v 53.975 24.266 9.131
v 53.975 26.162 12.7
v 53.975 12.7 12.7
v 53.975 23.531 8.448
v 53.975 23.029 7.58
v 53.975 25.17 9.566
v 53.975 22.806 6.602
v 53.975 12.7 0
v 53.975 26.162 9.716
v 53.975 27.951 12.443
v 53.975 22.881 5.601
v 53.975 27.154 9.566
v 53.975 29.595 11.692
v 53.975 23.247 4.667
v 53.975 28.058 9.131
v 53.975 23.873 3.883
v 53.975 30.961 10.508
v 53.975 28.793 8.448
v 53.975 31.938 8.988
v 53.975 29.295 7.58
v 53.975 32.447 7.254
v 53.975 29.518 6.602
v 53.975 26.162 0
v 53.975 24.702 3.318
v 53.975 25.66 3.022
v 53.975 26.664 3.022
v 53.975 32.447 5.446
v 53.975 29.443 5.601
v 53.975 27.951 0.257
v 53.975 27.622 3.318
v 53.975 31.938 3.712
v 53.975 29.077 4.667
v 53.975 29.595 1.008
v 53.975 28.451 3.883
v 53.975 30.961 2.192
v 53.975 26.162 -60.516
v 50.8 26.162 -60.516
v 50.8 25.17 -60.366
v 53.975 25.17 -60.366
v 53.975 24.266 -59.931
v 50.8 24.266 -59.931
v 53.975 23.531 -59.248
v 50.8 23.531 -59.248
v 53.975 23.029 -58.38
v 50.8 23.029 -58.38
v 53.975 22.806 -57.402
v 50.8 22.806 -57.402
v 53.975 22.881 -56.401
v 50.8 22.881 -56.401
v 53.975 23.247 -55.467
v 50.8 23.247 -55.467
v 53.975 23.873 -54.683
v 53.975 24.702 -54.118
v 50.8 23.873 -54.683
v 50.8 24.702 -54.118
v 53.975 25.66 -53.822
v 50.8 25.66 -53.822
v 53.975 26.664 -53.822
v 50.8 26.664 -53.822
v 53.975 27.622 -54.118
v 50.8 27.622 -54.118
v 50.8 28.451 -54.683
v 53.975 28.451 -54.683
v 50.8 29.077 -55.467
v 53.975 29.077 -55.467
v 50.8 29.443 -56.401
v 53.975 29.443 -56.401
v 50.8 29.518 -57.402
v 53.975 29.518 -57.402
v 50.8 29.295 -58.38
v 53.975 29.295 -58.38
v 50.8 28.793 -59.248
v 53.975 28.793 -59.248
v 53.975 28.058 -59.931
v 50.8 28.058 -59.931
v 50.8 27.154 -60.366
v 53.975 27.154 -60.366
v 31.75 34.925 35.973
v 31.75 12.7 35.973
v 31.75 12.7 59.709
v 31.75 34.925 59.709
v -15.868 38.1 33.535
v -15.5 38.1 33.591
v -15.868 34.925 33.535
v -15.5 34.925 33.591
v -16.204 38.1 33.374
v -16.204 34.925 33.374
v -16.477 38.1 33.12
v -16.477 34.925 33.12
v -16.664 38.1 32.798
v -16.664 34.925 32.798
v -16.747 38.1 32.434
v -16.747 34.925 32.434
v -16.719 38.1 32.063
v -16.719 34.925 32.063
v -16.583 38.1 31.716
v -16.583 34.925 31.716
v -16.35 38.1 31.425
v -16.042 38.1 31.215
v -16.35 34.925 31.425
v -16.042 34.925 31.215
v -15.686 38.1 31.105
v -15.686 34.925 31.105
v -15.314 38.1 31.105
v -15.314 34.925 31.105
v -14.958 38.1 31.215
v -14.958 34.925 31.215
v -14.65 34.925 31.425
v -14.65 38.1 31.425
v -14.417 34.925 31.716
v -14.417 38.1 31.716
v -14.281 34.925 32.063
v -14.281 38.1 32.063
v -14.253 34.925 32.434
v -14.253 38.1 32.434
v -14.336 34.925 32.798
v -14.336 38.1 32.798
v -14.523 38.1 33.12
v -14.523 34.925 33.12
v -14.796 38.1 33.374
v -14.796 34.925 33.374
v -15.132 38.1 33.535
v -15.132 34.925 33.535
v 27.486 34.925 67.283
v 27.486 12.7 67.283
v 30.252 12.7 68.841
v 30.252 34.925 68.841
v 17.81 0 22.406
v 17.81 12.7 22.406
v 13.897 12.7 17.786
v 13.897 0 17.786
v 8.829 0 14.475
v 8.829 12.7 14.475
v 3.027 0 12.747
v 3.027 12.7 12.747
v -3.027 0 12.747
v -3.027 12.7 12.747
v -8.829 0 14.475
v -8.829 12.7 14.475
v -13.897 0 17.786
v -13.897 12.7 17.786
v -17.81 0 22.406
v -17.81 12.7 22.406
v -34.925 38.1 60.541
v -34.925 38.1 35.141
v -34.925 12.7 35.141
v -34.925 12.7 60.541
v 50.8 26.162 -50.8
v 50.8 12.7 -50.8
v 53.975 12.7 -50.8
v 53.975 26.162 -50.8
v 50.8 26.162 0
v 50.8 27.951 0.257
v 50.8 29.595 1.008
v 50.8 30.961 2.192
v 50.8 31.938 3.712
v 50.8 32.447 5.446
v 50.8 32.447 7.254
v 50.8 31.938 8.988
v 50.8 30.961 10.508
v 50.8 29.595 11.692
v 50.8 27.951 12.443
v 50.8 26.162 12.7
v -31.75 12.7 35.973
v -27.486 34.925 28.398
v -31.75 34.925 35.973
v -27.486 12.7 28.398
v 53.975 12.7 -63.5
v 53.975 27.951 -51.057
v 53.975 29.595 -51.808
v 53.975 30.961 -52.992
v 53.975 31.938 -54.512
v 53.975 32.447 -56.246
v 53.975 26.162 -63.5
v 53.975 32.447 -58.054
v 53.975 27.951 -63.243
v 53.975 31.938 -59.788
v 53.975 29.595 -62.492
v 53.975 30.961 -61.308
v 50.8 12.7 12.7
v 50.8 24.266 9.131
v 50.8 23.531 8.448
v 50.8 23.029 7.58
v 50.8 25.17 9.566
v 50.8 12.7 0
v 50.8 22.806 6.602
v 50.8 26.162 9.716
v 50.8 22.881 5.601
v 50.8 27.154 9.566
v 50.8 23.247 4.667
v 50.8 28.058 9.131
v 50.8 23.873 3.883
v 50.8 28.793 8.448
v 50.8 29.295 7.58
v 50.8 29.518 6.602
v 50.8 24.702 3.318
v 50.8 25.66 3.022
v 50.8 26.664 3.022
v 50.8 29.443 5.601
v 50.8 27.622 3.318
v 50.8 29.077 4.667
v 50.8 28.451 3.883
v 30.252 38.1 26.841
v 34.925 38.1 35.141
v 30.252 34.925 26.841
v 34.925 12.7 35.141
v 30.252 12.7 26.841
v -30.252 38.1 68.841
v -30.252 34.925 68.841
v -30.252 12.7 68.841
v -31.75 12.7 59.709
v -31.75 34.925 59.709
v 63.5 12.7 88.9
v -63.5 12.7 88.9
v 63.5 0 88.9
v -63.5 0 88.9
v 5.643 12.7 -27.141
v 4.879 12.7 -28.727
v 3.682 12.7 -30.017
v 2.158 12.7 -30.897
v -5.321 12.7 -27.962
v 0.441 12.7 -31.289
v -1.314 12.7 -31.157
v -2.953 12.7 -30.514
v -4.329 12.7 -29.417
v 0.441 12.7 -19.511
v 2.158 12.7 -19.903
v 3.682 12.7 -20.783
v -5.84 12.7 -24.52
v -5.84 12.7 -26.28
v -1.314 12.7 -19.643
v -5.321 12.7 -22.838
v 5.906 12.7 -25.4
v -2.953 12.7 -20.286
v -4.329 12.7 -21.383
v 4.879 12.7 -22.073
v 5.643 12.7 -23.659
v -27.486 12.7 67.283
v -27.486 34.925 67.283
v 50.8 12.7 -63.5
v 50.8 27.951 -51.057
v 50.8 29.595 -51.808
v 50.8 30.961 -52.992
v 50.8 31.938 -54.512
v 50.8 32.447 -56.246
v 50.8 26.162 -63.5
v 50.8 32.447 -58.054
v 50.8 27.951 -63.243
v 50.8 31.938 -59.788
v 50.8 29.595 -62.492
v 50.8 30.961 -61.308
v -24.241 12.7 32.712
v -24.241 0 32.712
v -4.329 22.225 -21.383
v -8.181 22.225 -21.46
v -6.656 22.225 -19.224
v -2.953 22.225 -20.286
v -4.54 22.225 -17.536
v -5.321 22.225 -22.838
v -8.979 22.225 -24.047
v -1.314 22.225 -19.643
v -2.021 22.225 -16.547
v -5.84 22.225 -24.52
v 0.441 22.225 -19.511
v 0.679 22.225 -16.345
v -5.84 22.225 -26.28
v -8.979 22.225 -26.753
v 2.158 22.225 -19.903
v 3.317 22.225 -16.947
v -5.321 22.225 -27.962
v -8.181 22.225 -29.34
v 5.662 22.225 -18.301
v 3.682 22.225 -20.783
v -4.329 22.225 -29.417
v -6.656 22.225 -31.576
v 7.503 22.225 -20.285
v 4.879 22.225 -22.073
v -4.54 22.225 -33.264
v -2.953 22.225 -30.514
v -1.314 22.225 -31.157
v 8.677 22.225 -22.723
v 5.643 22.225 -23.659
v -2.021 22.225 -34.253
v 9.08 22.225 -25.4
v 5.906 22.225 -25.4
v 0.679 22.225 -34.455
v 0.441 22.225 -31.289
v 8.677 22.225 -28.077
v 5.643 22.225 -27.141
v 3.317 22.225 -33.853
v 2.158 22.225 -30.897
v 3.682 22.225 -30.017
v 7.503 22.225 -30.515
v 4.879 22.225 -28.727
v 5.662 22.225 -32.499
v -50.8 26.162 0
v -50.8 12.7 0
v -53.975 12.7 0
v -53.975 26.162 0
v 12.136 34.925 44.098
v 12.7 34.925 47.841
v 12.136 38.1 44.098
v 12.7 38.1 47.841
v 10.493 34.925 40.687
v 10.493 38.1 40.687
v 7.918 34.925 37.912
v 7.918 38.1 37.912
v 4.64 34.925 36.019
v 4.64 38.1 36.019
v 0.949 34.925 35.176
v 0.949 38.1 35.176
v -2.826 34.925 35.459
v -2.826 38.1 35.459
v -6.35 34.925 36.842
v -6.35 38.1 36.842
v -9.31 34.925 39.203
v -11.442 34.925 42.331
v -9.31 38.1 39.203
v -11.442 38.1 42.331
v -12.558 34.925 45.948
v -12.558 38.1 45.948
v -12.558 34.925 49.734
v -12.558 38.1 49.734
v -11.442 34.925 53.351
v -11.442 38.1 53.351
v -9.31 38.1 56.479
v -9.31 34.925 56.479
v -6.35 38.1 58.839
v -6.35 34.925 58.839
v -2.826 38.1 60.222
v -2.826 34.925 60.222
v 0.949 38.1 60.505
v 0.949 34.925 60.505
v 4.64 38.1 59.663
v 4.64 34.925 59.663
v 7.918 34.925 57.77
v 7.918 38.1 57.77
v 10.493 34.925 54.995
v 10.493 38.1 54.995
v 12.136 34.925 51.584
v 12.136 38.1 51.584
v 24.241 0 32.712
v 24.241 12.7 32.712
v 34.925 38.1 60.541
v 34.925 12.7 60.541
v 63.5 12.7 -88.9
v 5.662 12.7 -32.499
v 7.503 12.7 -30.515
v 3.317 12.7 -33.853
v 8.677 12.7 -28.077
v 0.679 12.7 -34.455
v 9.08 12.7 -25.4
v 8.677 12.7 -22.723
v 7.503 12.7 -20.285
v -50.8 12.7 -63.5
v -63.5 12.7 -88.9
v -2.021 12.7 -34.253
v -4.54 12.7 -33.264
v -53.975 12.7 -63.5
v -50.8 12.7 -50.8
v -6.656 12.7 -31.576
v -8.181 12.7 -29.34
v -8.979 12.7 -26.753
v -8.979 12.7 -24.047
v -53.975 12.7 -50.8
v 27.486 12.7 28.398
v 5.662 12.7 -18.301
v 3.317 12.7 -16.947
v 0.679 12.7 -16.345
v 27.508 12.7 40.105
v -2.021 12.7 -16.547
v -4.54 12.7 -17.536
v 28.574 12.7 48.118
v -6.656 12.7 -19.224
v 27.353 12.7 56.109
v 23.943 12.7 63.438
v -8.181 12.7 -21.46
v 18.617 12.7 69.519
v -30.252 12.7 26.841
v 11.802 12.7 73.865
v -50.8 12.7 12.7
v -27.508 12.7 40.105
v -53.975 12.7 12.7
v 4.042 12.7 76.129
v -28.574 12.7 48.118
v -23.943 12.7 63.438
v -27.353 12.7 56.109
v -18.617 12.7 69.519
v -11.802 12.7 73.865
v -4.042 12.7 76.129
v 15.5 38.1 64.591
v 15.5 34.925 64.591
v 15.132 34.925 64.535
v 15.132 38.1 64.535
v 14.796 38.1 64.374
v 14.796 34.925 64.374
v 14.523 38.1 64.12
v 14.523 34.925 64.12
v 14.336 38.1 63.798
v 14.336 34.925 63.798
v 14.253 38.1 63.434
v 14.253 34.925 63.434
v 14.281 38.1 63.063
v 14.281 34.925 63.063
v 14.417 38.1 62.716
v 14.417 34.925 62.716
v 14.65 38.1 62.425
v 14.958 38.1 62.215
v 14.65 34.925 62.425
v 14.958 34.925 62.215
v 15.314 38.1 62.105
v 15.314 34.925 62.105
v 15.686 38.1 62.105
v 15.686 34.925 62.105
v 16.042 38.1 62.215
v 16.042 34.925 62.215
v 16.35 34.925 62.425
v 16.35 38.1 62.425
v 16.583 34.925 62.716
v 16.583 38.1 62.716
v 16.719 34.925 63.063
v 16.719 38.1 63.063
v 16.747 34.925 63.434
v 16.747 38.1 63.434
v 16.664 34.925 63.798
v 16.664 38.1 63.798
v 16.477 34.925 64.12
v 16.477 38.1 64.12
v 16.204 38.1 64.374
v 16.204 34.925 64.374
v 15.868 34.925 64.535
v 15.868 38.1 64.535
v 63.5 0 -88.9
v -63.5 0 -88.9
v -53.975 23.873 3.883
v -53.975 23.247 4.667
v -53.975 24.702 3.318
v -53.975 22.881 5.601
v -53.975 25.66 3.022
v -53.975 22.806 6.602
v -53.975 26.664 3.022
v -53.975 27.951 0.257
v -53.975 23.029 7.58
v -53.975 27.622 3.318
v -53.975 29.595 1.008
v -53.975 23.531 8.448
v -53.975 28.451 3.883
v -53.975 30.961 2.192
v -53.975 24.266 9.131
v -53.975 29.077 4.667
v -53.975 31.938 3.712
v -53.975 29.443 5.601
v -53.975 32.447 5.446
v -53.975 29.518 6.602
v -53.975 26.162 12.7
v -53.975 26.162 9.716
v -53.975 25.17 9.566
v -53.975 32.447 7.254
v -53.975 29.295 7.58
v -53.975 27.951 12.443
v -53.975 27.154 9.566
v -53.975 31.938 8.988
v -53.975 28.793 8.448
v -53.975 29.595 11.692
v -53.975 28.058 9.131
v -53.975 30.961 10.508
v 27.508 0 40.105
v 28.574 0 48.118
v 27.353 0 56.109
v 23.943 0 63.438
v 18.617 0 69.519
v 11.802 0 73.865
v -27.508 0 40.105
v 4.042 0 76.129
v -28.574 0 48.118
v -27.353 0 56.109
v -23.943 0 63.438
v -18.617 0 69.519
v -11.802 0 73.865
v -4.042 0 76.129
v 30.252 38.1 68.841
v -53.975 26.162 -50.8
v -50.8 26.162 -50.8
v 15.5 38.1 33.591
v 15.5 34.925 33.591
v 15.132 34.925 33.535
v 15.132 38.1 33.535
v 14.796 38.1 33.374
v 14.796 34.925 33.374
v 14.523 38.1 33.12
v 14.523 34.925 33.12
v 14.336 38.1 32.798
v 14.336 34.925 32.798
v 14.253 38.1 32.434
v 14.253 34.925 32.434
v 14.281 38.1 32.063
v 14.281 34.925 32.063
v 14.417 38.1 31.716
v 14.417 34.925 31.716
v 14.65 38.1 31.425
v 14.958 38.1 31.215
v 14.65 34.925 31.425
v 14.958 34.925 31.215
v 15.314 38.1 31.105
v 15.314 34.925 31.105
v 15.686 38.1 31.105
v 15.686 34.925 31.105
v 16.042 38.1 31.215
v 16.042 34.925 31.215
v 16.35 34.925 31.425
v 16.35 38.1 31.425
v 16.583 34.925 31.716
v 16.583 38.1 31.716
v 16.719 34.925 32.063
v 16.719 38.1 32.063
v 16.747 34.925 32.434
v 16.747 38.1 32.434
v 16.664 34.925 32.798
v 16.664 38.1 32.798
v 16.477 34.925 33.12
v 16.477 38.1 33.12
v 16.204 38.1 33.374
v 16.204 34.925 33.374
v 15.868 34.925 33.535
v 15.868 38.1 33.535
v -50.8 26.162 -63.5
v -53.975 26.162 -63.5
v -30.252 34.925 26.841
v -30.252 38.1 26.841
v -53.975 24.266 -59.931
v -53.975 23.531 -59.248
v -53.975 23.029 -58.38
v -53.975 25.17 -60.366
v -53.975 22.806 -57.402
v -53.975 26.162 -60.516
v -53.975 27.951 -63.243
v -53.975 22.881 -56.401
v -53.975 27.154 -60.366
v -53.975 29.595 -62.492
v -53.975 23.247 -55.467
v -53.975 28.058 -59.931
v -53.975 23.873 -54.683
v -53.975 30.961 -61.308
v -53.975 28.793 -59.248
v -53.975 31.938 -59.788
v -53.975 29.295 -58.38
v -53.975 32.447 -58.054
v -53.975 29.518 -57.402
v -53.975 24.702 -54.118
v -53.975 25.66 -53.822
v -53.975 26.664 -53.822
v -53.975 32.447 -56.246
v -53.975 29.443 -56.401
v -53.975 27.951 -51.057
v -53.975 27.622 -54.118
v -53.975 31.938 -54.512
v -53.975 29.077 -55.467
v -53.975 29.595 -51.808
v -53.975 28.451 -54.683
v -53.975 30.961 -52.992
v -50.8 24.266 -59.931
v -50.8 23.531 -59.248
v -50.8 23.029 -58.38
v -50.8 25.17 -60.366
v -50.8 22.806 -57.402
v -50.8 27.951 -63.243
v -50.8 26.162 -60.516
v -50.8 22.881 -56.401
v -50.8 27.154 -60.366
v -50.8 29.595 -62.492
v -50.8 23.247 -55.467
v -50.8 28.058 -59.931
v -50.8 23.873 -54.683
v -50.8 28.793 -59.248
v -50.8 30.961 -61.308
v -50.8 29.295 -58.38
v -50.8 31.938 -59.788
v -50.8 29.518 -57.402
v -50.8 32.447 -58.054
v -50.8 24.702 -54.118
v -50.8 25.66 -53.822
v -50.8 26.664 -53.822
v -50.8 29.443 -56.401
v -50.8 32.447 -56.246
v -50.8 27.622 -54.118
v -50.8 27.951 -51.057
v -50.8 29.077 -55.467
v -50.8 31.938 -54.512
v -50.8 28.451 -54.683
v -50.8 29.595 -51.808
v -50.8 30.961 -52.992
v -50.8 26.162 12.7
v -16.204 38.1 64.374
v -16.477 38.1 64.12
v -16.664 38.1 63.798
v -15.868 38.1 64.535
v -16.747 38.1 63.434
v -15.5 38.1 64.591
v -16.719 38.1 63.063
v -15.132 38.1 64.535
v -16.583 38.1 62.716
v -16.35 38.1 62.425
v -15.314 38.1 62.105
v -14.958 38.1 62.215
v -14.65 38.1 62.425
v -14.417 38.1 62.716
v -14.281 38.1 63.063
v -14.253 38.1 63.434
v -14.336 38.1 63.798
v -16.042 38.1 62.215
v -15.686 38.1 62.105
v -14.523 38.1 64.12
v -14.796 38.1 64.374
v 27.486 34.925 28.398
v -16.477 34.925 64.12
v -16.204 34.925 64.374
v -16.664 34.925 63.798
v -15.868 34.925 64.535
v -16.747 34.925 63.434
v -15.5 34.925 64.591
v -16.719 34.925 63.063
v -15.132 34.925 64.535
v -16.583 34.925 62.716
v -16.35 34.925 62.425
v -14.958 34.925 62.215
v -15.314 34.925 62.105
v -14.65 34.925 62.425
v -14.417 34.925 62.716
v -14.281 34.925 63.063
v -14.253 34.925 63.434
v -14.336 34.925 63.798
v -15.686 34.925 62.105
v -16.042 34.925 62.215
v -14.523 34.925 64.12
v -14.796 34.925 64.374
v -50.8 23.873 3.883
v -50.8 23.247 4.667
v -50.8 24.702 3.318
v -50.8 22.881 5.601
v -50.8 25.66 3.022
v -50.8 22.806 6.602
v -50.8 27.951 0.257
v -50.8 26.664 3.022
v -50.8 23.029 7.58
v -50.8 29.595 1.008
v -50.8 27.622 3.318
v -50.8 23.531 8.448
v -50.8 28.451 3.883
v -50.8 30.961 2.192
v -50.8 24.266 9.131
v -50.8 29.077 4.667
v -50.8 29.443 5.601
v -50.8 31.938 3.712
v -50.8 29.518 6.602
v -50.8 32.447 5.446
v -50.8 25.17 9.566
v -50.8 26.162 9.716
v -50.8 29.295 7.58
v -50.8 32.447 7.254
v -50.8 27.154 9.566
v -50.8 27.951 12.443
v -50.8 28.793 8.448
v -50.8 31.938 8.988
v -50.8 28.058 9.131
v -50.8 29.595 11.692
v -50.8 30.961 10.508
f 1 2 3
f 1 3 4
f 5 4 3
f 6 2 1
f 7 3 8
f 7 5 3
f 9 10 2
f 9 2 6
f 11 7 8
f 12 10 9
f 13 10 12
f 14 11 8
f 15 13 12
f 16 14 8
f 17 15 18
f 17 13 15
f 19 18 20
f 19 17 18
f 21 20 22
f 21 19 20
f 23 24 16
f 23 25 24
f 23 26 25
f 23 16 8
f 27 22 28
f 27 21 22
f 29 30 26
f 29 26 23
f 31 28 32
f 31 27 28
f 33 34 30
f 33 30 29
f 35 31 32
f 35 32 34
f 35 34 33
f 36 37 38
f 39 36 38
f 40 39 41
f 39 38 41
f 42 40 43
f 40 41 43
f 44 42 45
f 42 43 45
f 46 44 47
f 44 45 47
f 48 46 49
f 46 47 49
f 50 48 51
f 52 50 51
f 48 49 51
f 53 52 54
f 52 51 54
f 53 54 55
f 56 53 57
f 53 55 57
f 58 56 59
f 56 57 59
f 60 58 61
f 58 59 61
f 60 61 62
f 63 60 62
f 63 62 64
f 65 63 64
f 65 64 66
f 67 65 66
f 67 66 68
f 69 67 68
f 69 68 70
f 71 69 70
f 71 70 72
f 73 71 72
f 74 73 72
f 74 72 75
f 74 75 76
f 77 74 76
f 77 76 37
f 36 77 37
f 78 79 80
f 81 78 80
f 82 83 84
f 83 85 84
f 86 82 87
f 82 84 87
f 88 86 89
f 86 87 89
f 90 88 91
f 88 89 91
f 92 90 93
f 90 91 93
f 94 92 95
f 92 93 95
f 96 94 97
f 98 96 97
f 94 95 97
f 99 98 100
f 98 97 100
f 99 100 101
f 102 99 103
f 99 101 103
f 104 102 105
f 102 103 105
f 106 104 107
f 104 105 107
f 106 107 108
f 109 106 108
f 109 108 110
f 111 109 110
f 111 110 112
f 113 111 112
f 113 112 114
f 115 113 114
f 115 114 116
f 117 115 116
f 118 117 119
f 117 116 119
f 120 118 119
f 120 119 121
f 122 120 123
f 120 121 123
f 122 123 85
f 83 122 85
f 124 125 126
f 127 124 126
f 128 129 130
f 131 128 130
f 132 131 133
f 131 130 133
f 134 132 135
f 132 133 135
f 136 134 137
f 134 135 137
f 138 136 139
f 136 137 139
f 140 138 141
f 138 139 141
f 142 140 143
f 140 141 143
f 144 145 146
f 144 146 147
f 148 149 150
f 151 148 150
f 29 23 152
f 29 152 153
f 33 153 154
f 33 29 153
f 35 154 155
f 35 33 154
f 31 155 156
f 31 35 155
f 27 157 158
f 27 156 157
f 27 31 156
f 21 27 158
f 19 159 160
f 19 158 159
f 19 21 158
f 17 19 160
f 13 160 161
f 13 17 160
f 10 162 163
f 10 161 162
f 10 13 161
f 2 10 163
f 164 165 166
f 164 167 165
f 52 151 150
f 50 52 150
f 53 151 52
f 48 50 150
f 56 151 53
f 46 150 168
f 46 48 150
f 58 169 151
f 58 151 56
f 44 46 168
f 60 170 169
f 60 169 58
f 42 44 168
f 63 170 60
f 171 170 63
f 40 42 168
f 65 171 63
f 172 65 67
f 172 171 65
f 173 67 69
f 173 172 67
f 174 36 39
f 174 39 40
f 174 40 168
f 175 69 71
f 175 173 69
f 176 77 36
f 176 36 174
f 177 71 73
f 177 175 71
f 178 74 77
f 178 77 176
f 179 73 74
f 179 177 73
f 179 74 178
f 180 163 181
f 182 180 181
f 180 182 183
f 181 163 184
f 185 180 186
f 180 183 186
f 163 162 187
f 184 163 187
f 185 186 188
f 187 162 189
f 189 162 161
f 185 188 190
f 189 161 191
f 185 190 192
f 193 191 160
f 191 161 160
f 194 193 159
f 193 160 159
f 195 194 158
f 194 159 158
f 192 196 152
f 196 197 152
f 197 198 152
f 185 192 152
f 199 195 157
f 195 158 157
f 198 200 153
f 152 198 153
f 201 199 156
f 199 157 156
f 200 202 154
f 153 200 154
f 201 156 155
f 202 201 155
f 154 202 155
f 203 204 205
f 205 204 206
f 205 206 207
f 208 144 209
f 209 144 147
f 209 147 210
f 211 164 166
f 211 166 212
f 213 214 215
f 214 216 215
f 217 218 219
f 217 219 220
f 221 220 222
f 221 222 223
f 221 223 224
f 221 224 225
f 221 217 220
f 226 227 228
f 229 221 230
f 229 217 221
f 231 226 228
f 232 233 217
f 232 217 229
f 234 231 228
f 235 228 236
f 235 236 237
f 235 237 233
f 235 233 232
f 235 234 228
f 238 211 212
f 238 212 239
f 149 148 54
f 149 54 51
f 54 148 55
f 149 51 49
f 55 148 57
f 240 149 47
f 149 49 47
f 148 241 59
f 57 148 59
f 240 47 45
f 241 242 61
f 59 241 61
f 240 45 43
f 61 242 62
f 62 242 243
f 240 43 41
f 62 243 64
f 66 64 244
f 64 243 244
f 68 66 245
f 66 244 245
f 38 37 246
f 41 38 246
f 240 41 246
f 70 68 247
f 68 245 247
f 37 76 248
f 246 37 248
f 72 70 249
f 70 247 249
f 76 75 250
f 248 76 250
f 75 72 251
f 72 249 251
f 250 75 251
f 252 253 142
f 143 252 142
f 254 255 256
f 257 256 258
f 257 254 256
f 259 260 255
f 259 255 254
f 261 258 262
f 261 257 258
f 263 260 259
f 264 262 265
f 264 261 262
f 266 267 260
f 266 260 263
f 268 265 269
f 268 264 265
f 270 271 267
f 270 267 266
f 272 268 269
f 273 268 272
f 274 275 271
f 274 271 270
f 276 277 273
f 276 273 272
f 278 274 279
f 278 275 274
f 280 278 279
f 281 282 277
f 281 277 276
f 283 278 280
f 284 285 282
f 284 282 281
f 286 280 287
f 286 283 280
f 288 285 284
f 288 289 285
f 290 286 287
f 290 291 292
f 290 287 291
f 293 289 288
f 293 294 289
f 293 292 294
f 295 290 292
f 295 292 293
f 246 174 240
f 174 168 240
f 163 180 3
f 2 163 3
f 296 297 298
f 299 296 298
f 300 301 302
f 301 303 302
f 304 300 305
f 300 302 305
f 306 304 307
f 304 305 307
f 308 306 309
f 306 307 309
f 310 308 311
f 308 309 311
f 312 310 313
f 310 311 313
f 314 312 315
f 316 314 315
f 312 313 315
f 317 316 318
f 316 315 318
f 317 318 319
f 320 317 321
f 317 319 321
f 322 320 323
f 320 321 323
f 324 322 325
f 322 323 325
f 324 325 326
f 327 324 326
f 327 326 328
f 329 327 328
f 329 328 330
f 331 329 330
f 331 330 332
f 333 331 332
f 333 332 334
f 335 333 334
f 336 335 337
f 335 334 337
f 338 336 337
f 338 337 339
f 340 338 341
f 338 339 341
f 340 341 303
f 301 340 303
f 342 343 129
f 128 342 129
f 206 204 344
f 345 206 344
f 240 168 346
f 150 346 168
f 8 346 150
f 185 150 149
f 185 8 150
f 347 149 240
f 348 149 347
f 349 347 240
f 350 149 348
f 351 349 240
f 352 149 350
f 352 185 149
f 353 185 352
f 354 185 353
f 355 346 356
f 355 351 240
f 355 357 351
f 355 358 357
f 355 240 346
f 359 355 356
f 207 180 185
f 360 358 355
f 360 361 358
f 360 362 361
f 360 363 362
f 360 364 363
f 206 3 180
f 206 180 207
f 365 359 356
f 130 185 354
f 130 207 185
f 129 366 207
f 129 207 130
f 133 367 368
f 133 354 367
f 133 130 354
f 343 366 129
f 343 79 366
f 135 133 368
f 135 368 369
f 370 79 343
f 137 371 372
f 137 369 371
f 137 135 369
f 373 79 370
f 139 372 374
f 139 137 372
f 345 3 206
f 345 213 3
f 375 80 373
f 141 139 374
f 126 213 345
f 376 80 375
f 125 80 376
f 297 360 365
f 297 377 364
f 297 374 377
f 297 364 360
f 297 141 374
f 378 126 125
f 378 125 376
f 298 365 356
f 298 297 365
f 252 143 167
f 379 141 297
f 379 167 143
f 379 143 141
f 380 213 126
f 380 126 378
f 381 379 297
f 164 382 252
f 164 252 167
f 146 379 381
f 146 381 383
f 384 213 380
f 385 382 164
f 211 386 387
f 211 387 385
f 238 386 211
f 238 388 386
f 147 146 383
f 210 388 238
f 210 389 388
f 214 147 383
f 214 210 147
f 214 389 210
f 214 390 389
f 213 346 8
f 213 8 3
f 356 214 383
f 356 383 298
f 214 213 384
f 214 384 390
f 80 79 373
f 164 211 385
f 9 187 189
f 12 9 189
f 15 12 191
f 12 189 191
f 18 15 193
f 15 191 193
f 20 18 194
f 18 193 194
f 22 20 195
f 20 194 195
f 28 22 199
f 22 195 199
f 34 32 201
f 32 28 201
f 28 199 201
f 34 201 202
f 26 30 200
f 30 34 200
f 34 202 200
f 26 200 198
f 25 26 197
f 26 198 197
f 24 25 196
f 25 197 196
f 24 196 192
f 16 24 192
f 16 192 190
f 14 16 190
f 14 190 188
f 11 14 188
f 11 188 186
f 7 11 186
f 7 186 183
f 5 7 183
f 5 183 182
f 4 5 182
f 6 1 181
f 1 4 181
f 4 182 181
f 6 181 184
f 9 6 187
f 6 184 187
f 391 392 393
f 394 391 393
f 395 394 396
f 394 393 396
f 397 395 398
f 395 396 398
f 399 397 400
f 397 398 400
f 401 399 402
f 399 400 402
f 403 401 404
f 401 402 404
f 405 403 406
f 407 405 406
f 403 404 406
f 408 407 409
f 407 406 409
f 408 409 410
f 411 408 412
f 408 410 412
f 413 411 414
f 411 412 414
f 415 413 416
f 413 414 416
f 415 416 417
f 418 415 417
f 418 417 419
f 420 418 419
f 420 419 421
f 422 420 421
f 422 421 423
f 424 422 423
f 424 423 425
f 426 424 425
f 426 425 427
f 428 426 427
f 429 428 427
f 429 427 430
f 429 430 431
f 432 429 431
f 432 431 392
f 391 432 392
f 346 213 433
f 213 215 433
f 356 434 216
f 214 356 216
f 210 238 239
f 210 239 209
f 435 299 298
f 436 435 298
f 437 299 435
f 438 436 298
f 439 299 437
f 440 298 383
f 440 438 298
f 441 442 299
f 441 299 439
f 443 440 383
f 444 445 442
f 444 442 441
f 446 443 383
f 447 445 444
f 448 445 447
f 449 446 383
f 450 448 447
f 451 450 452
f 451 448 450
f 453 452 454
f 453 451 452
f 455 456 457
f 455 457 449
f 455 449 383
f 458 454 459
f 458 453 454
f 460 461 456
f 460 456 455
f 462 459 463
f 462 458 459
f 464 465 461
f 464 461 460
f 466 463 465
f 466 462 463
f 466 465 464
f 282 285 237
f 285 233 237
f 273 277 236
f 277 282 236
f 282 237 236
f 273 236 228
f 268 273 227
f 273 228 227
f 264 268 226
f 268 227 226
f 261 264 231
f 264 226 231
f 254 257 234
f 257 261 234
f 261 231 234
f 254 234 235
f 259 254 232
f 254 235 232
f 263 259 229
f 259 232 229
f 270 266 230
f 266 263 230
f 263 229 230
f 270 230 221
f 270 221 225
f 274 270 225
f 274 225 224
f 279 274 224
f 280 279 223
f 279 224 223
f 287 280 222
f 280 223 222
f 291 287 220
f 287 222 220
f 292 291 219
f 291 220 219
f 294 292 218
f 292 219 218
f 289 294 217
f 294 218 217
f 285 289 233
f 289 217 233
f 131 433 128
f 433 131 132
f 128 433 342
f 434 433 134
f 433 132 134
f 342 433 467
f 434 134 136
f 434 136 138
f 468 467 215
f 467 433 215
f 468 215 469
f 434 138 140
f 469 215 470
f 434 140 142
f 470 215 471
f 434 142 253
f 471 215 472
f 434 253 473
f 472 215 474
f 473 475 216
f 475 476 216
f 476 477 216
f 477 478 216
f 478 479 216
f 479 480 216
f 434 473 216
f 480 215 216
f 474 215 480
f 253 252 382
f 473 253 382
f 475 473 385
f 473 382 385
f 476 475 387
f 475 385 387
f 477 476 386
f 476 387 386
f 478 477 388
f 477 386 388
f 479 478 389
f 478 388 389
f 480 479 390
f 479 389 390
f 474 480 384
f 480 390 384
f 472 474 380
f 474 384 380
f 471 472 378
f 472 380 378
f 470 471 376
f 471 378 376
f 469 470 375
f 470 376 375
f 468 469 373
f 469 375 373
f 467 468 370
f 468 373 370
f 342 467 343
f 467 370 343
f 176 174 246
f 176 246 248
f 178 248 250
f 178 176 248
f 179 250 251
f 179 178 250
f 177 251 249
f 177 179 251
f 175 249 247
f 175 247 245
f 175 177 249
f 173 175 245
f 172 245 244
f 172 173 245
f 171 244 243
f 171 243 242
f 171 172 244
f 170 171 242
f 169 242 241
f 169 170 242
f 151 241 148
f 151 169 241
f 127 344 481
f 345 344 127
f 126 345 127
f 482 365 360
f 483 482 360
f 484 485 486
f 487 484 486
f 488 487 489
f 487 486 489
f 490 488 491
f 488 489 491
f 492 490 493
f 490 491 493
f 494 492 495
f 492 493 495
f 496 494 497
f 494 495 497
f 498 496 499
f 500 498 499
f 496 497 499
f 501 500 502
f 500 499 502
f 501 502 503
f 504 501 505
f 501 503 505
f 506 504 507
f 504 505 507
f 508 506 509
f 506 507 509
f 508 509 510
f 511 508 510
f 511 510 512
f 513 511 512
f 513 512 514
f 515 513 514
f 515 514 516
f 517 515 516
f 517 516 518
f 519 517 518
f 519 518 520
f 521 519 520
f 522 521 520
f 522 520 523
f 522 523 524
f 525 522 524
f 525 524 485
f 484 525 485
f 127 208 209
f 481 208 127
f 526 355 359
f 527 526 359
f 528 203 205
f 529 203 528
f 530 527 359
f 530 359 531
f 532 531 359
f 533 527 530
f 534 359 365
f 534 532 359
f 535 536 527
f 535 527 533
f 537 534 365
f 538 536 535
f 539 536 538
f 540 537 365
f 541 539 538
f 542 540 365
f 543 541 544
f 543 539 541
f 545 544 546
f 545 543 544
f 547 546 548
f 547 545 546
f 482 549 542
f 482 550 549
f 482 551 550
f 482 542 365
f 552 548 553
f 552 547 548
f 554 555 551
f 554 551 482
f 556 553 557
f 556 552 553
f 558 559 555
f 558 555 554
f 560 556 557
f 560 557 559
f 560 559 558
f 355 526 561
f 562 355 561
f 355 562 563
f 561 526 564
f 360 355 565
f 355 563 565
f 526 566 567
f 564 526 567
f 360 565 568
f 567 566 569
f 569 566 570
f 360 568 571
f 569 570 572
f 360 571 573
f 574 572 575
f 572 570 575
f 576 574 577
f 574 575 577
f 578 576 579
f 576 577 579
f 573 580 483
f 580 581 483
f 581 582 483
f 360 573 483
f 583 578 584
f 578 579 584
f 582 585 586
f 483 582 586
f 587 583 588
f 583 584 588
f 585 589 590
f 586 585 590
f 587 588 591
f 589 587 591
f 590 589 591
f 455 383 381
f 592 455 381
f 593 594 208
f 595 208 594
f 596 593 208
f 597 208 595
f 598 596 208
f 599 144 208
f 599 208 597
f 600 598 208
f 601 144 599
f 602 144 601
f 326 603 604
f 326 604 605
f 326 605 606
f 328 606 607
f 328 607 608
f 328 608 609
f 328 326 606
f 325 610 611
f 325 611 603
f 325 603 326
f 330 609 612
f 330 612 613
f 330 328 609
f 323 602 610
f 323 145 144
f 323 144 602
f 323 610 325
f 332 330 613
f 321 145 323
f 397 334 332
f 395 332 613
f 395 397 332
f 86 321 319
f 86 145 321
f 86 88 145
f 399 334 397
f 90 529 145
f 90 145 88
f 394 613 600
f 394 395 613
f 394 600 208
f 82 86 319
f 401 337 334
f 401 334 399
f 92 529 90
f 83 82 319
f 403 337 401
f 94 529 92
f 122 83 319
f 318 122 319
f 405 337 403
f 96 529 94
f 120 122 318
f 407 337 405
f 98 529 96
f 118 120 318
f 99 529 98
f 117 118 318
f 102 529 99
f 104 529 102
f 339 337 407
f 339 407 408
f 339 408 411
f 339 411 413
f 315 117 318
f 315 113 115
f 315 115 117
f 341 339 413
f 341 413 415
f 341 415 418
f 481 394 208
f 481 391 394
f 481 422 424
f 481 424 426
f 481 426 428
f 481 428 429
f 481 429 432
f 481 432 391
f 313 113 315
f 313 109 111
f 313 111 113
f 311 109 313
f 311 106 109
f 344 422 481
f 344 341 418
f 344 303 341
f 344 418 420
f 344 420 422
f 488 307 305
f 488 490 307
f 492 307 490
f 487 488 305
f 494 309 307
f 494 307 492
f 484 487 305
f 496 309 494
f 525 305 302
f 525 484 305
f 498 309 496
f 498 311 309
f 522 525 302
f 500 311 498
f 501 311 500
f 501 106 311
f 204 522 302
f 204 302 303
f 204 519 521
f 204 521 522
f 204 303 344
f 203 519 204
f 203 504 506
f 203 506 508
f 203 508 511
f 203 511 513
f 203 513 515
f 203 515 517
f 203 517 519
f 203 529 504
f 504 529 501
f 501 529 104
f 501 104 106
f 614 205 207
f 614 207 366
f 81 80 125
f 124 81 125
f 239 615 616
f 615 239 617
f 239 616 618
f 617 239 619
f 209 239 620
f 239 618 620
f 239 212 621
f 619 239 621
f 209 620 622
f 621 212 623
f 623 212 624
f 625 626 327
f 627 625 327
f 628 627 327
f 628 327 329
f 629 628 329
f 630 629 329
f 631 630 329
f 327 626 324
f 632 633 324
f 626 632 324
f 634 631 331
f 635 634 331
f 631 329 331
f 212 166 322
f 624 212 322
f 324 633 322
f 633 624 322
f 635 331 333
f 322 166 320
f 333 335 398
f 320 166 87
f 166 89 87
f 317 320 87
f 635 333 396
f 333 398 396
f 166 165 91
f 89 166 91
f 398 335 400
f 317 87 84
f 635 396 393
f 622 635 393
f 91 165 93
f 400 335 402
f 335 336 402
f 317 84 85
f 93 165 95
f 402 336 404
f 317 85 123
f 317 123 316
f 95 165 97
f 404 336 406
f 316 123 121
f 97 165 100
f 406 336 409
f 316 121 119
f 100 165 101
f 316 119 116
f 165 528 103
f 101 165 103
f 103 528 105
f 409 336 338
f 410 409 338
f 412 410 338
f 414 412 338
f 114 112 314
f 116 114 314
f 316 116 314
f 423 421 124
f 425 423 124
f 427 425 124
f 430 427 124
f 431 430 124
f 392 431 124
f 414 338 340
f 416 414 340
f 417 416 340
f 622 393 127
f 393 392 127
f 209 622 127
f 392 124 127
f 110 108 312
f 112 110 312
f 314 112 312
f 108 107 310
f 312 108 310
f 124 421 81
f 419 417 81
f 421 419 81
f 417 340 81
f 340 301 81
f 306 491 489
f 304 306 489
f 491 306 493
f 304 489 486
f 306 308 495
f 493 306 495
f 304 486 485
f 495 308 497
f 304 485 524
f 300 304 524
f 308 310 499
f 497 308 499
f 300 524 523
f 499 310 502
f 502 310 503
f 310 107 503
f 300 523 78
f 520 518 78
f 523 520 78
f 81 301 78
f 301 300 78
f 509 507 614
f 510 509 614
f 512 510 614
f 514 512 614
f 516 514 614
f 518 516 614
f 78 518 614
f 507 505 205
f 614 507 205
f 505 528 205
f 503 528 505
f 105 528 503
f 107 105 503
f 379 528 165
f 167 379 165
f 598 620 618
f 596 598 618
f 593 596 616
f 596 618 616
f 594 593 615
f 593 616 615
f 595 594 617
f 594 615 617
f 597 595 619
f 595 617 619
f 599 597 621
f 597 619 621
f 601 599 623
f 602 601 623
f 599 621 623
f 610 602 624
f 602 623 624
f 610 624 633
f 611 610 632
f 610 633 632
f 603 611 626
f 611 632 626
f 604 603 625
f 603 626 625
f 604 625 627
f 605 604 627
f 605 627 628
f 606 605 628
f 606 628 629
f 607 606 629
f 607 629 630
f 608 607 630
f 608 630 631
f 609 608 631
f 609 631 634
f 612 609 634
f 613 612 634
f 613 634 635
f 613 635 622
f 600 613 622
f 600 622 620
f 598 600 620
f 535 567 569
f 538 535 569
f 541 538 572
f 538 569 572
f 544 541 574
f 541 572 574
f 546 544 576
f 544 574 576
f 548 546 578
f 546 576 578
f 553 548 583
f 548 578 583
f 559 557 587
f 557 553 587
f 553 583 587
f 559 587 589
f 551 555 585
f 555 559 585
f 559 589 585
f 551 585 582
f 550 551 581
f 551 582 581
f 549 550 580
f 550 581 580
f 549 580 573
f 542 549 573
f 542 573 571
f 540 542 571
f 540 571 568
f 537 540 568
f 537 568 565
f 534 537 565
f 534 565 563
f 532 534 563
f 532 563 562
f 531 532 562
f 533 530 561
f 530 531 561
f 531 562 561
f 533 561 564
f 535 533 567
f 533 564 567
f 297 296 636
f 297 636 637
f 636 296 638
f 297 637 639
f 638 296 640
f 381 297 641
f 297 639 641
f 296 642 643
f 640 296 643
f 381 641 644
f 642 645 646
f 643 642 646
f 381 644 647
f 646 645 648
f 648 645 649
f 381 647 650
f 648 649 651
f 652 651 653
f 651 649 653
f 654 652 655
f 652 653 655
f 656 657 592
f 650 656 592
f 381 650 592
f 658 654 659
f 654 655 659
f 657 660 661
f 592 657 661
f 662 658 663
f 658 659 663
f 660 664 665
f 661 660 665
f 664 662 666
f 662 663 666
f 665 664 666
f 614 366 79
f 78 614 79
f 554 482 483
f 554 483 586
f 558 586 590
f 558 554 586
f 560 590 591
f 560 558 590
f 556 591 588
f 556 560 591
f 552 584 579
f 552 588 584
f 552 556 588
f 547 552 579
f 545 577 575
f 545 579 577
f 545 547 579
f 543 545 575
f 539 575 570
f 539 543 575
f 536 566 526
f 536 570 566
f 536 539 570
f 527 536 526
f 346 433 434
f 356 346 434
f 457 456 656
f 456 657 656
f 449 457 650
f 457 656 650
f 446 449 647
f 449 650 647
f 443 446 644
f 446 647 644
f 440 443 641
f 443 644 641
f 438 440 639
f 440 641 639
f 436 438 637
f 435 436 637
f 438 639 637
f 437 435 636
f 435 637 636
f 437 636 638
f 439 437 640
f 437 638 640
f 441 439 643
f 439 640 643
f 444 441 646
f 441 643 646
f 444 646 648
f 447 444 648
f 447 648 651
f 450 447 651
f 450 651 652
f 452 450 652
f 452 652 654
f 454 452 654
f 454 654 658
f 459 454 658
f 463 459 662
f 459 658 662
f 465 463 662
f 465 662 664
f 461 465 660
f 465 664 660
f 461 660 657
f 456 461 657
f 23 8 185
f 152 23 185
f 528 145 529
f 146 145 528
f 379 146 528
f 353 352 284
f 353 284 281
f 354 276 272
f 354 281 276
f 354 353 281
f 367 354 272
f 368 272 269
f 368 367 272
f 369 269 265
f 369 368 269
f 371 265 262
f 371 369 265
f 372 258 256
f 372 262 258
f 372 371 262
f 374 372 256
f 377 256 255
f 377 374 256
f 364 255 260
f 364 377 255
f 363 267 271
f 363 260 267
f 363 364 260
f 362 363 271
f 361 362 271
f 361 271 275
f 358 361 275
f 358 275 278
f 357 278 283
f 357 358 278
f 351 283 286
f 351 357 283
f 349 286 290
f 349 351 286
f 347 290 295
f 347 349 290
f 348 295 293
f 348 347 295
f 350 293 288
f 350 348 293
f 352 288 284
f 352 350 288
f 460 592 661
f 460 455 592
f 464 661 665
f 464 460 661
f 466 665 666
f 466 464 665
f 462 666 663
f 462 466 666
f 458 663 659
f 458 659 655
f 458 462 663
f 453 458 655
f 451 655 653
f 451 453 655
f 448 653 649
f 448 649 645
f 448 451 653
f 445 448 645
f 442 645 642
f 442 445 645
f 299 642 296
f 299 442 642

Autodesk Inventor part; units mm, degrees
ref_plane "YZ Plane" through (0, 0, 0) normal (1, 0, 0) x (0, 1, 0)
ref_plane "XZ Plane" through (0, 0, 0) normal (0, 1, 0) x (-1, 0, 0)
ref_plane "XY Plane" through (0, 0, 0) normal (0, 0, 1) x (1, 0, 0)
sketch "Sketch1" plane through (0, 0, 0) normal (0, 1, 0) x (-1, 0, 0)
  line L0 (63.5, 88.9) -> (-63.5, 88.9)
  line L1 (-63.5, 88.9) -> (-63.5, -88.9)
  line L2 (-63.5, -88.9) -> (63.5, -88.9)
  line L3 (63.5, -88.9) -> (63.5, 88.9)
  line L4 (63.5, 88.9) -> (-63.5, -88.9) construction
  line L5 (-63.5, 88.9) -> (63.5, -88.9) construction
  point P0 (0, 0)
  dimension "d0" = 127
  dimension "d1" = 177.8
extrude "Extrusion1" add sketch "Sketch1" along normal blind 12.7
sketch "Sketch2" plane through (0, 12.7, 0) normal (0, 1, 0) x (1, 0, 0)
  circle A0 centre (0, 25.4) radius 51.0159
  line L0 (-63.5, 88.9) -> (-63.5, -88.9) projected
  line L1 (63.5, 88.9) -> (-63.5, 88.9) projected
  point P0 (0, 0)
  dimension "d4" = 102.0318
  dimension "d5" = 63.5
  dimension "d6" = 63.5
sketch "Sketch3" plane through (0, 12.7, 0) normal (0, 1, 0) x (1, 0, 0)
  arc A0 (-24.2412, -32.7116) -> (24.2412, -32.7116) centre (0, -47.8409) ccw
  line L0 (-24.2412, -32.7116) -> (-17.8095, -22.4063)
  line L1 (0, 124.46) -> (0, -124.46) projected
  line L2 (24.2412, -32.7116) -> (17.8095, -22.4063)
  arc A1 (17.8095, -22.4063) -> (-17.8095, -22.4063) centre (0, -33.5215) ccw
  circle A2 centre (0, -47.8409) radius 22.225 construction
  circle A3 centre (0, 25.4) radius 51.0159 projected
  point P0 (0, 0)
  dimension "d13" = 57.15
  dimension "d14" = 70
  dimension "d58" = 44.45
extrude "Extrusion3" cut sketch "Sketch3" against normal through all contours L0 A3 L1 A0 | L1 A3 L2 A0 | A1 L1 A3 | L1 A1 A3 picked at (-3.4245, -21.2764) picked at (3.4245, -21.2764)
sketch "Sketch5" plane through (0, 12.7, 0) normal (0, 1, 0) x (1, 0, 0)
  line L0 (-34.925, -35.1409) -> (-30.2521, -26.8409)
  line L1 (-30.2521, -26.8409) -> (-27.4855, -28.3985)
  line L2 (-27.4855, -28.3985) -> (-31.75, -35.9732)
  line L3 (-31.75, -35.9732) -> (-31.75, -59.7086)
  line L4 (-31.75, -59.7086) -> (-27.4855, -67.2833)
  line L5 (-27.4855, -67.2833) -> (-30.2521, -68.8409)
  line L6 (-34.925, -35.1409) -> (-34.925, -60.5409)
  line L7 (-34.925, -60.5409) -> (-30.2521, -68.8409)
  arc A0 (-24.2412, -32.7116) -> (24.2412, -32.7116) centre (0, -47.8409) ccw projected
  arc A1 (-24.2412, -32.7116) -> (24.2412, -32.7116) centre (0, -47.8409) ccw construction
  line L8 (-28.575, -47.8409) -> (28.575, -47.8409) construction
  line L9 (0, 124.46) -> (0, -124.46) construction
  line L10 (34.925, -35.1409) -> (30.2521, -26.8409)
  line L11 (30.2521, -26.8409) -> (27.4855, -28.3985)
  line L12 (27.4855, -28.3985) -> (31.75, -35.9732)
  line L13 (31.75, -35.9732) -> (31.75, -59.7086)
  line L14 (31.75, -59.7086) -> (27.4855, -67.2833)
  line L15 (27.4855, -67.2833) -> (30.2521, -68.8409)
  line L16 (34.925, -35.1409) -> (34.925, -60.5409)
  line L17 (34.925, -60.5409) -> (30.2521, -68.8409)
  point P0 (0, 0)
  point P1 (-31.75, -47.8409)
  point P2 (31.75, -47.8409)
  dimension "d16" = 3.175
  dimension "d17" = 3.175
  dimension "d18" = 3.175
  dimension "d19" = 42
  dimension "d20" = 25.4
  dimension "d21" = 9.525
  dimension "d22" = 63.5
extrude "Extrusion4" add sketch "Sketch5" along normal blind 25.4
sketch "Sketch6" plane through (0, 38.1, 0) normal (0, 1, 0) x (1, 0, 0)
  line L0 (-30.2521, -68.8409) -> (-27.4855, -67.2833) projected
  line L1 (27.4855, -67.2833) -> (30.2521, -68.8409) projected
  line L2 (31.75, -59.7086) -> (27.4855, -67.2833) projected
  line L3 (31.75, -35.9732) -> (31.75, -59.7086) projected
  line L4 (27.4855, -28.3985) -> (31.75, -35.9732) projected
  line L5 (30.2521, -26.8409) -> (27.4855, -28.3985) projected
  line L6 (-27.4855, -28.3985) -> (-30.2521, -26.8409) projected
  line L7 (-31.75, -35.9732) -> (-27.4855, -28.3985) projected
  line L8 (-31.75, -59.7086) -> (-31.75, -35.9732) projected
  line L9 (-27.4855, -67.2833) -> (-31.75, -59.7086) projected
  line L10 (-30.2521, -68.8409) -> (30.2521, -68.8409)
  line L11 (30.2521, -26.8409) -> (-30.2521, -26.8409)
  point P0 (0, 0)
extrude "Extrusion5" add sketch "Sketch6" against normal blind 3.175
sketch "Sketch7" plane through (0, 38.1, 0) normal (0, 1, 0) x (1, 0, 0)
  arc A0 (-24.2412, -32.7116) -> (24.2412, -32.7116) centre (0, -47.8409) ccw projected
  line L0 (21, -68.8409) -> (-21, -68.8409) construction
  line L1 (-21, -68.8409) -> (-21, -26.8409) construction
  line L2 (-21, -26.8409) -> (21, -26.8409) construction
  line L3 (21, -26.8409) -> (21, -68.8409) construction
  line L4 (21, -68.8409) -> (-21, -26.8409) construction
  line L5 (-21, -68.8409) -> (21, -26.8409) construction
  line L6 (15.5, -63.3409) -> (-15.5, -63.3409) construction
  line L7 (-15.5, -63.3409) -> (-15.5, -32.3409) construction
  line L8 (-15.5, -32.3409) -> (15.5, -32.3409) construction
  line L9 (15.5, -32.3409) -> (15.5, -63.3409) construction
  line L10 (15.5, -63.3409) -> (-15.5, -32.3409) construction
  line L11 (-15.5, -63.3409) -> (15.5, -32.3409) construction
  circle A1 centre (0, -47.8409) radius 12.7
  point P0 (0, 0)
  dimension "d27" = 42
  dimension "d28" = 42
  dimension "d29" = 31
  dimension "d30" = 31
  dimension "d31" = 25.4
extrude "Extrusion6" cut sketch "Sketch7" against normal through all
hole "Hole1" at (-15.5, 38.1, 63.3409) at (15.5, 38.1, 63.3409) at (15.5, 38.1, 32.3409) at (-15.5, 38.1, 32.3409) direction (0, -1, 0) diameter 2.5 depth 3.175 tip angle 118
sketch "Sketch8" plane through (0, 12.7, 0) normal (0, 1, 0) x (1, 0, 0)
  line L0 (-53.975, -12.7) -> (-50.8, -12.7)
  line L1 (-50.8, -12.7) -> (-50.8, 0)
  line L2 (-50.8, 0) -> (-53.975, 0)
  line L3 (-53.975, 0) -> (-53.975, -12.7)
  line L4 (-51.0159, 25.4) -> (51.0159, 25.4) construction
  line L5 (0, -25.6159) -> (0, 76.4159) construction
  point P0 (0, 0)
  point P1 (0, 25.4)
  point P2 (0, 25.4)
  dimension "d41" = 12.7
  dimension "d42" = 3.175
  dimension "d43" = 25.4
  dimension "d44" = 50.8
extrude "Extrusion7" add sketch "Sketch8" along normal blind 13.462
sketch "Sketch9" plane through (-53.975, 12.7, 0) normal (-1, 0, 0) x (0, 0, 1)
  line L0 (12.7, 13.462) -> (0, 13.462) projected
  arc A0 (12.7, 13.462) -> (0, 13.462) centre (6.35, 13.462) ccw
  point P0 (0, -12.7)
extrude "Extrusion8" add sketch "Sketch9" against normal blind 3.175
hole "Hole2" at (-53.975, 26.162, 6.35) direction (1, 0, 0) diameter 6.731 depth 3.175 tip angle 118
ref_plane "Work Plane1" through (-51.0159, 12.7, -25.4) normal (0, 0, 1) x (1, 0, 0)
ref_plane "Work Plane2" through (0, 12.7, 25.6159) normal (1, 0, 0) x (0, 0, -1)
mirror "Mirror1" about plane through (-51.0159, 12.7, -25.4) normal (0, 0, 1) of "Extrusion7", "Extrusion8", "Hole2"
mirror "Mirror2" about plane through (0, 12.7, 25.6159) normal (1, 0, 0) of "Extrusion7", "Extrusion8", "Hole2", "Mirror1"
sketch "Sketch11" plane through (0, 12.7, 0) normal (0, 1, 0) x (1, 0, 0)
  circle A0 centre (0, 25.4) radius 51.0159 projected
  circle A1 centre (0, 25.4) radius 9.0805
  circle A2 centre (0, 25.4) radius 5.9055
  point P0 (0, 0)
  dimension "d59" = 18.161
  dimension "d60" = 3.175
extrude "Extrusion9" add sketch "Sketch11" along normal blind 9.525 contours A1
equation "\"d0\" = base_width"
equation "\"d1\" = base_length"
equation "\"d2\" = base_height"
equation "\"d6\" = d5"
equation "\"d14\" = base_cutout_contact_angle"
equation "\"d58\" = base_cutout_diameter"
equation "\"d16\" = turntable_motor_support_thickness"
equation "\"d17\" = turntable_motor_support_thickness"
equation "\"d18\" = turntable_motor_support_thickness"
equation "\"d22\" = turntable_motor_support_width"
equation "\"d23\" = turntable_motor_support_height"
equation "\"d25\" = turntable_motor_support_thickness"
equation "\"d31\" = turntable_motor_boss"
equation "\"d32\" = turntable_motor_support_thickness"
equation "\"d39\" = turntable_motor_support_thickness"
equation "\"d54\" = turntable_motor_support_thickness"
equation "\"d61\" = turntable_ring_height"
equation "\"base_length\" = 177.8"
equation "\"base_width\" = 127"
equation "\"base_height\" = 12.7"
equation "\"turntable_diameter\" = 101.6"
equation "\"turntable_height\" = 9.525"
equation "\"turntable_spur_width\" = 6.35"
equation "\"spine_diameter\" = 31.75"
equation "\"spine_height\" = 25.4"
equation "\"shoulder_length\" = 50.8"
equation "\"shoulder_width\" = 69.85"
equation "\"shoulder_wall_thickness\" = 4.7625"
equation "\"shoulder_gear_diameter\" = 63.5"
equation "\"shoulder_motor_gear_diameter\" = 25.4"
equation "\"shoulder_gear_shaft_diameter\" = 12.7"
equation "\"shoulder_motor_boss\" = 25.4"
equation "\"turntable_bed_depth\" = 0"
equation "\"base_cutout_diameter\" = 44.45"
equation "\"base_turntable_contact_angle\" = 60deg"
equation "\"base_cutout_contact_angle\" = 70deg"
equation "\"turntable_motor_support_thickness\" = 3.175"
equation "\"turntable_motor_support_height\" = 25.4"
equation "\"turntable_motor_boss\" = 25.4"
equation "\"turntable_motor_support_width\" = 63.5"
equation "\"turntable_retention_shaft_diameter\" = 6.35"
equation "\"turntable_retention_shaft_length\" = 152.4"
equation "\"shoulder_gear_thickness\" = 6.35"
equation "\"arm_distal_length\" = 152.4"
equation "\"arm_proximal_length\" = 203.2"
equation "\"arm_proximal_central_diameter\" = 25.4"
equation "\"arm_proximal_thickness\" = 9.525"
equation "\"arm_proximal_motor_boss\" = 25.4"
equation "\"turntable_ring_height\" = 9.525"
equation "\"turntable_ring_diameter\" = 19.05"
properties part number "base"
